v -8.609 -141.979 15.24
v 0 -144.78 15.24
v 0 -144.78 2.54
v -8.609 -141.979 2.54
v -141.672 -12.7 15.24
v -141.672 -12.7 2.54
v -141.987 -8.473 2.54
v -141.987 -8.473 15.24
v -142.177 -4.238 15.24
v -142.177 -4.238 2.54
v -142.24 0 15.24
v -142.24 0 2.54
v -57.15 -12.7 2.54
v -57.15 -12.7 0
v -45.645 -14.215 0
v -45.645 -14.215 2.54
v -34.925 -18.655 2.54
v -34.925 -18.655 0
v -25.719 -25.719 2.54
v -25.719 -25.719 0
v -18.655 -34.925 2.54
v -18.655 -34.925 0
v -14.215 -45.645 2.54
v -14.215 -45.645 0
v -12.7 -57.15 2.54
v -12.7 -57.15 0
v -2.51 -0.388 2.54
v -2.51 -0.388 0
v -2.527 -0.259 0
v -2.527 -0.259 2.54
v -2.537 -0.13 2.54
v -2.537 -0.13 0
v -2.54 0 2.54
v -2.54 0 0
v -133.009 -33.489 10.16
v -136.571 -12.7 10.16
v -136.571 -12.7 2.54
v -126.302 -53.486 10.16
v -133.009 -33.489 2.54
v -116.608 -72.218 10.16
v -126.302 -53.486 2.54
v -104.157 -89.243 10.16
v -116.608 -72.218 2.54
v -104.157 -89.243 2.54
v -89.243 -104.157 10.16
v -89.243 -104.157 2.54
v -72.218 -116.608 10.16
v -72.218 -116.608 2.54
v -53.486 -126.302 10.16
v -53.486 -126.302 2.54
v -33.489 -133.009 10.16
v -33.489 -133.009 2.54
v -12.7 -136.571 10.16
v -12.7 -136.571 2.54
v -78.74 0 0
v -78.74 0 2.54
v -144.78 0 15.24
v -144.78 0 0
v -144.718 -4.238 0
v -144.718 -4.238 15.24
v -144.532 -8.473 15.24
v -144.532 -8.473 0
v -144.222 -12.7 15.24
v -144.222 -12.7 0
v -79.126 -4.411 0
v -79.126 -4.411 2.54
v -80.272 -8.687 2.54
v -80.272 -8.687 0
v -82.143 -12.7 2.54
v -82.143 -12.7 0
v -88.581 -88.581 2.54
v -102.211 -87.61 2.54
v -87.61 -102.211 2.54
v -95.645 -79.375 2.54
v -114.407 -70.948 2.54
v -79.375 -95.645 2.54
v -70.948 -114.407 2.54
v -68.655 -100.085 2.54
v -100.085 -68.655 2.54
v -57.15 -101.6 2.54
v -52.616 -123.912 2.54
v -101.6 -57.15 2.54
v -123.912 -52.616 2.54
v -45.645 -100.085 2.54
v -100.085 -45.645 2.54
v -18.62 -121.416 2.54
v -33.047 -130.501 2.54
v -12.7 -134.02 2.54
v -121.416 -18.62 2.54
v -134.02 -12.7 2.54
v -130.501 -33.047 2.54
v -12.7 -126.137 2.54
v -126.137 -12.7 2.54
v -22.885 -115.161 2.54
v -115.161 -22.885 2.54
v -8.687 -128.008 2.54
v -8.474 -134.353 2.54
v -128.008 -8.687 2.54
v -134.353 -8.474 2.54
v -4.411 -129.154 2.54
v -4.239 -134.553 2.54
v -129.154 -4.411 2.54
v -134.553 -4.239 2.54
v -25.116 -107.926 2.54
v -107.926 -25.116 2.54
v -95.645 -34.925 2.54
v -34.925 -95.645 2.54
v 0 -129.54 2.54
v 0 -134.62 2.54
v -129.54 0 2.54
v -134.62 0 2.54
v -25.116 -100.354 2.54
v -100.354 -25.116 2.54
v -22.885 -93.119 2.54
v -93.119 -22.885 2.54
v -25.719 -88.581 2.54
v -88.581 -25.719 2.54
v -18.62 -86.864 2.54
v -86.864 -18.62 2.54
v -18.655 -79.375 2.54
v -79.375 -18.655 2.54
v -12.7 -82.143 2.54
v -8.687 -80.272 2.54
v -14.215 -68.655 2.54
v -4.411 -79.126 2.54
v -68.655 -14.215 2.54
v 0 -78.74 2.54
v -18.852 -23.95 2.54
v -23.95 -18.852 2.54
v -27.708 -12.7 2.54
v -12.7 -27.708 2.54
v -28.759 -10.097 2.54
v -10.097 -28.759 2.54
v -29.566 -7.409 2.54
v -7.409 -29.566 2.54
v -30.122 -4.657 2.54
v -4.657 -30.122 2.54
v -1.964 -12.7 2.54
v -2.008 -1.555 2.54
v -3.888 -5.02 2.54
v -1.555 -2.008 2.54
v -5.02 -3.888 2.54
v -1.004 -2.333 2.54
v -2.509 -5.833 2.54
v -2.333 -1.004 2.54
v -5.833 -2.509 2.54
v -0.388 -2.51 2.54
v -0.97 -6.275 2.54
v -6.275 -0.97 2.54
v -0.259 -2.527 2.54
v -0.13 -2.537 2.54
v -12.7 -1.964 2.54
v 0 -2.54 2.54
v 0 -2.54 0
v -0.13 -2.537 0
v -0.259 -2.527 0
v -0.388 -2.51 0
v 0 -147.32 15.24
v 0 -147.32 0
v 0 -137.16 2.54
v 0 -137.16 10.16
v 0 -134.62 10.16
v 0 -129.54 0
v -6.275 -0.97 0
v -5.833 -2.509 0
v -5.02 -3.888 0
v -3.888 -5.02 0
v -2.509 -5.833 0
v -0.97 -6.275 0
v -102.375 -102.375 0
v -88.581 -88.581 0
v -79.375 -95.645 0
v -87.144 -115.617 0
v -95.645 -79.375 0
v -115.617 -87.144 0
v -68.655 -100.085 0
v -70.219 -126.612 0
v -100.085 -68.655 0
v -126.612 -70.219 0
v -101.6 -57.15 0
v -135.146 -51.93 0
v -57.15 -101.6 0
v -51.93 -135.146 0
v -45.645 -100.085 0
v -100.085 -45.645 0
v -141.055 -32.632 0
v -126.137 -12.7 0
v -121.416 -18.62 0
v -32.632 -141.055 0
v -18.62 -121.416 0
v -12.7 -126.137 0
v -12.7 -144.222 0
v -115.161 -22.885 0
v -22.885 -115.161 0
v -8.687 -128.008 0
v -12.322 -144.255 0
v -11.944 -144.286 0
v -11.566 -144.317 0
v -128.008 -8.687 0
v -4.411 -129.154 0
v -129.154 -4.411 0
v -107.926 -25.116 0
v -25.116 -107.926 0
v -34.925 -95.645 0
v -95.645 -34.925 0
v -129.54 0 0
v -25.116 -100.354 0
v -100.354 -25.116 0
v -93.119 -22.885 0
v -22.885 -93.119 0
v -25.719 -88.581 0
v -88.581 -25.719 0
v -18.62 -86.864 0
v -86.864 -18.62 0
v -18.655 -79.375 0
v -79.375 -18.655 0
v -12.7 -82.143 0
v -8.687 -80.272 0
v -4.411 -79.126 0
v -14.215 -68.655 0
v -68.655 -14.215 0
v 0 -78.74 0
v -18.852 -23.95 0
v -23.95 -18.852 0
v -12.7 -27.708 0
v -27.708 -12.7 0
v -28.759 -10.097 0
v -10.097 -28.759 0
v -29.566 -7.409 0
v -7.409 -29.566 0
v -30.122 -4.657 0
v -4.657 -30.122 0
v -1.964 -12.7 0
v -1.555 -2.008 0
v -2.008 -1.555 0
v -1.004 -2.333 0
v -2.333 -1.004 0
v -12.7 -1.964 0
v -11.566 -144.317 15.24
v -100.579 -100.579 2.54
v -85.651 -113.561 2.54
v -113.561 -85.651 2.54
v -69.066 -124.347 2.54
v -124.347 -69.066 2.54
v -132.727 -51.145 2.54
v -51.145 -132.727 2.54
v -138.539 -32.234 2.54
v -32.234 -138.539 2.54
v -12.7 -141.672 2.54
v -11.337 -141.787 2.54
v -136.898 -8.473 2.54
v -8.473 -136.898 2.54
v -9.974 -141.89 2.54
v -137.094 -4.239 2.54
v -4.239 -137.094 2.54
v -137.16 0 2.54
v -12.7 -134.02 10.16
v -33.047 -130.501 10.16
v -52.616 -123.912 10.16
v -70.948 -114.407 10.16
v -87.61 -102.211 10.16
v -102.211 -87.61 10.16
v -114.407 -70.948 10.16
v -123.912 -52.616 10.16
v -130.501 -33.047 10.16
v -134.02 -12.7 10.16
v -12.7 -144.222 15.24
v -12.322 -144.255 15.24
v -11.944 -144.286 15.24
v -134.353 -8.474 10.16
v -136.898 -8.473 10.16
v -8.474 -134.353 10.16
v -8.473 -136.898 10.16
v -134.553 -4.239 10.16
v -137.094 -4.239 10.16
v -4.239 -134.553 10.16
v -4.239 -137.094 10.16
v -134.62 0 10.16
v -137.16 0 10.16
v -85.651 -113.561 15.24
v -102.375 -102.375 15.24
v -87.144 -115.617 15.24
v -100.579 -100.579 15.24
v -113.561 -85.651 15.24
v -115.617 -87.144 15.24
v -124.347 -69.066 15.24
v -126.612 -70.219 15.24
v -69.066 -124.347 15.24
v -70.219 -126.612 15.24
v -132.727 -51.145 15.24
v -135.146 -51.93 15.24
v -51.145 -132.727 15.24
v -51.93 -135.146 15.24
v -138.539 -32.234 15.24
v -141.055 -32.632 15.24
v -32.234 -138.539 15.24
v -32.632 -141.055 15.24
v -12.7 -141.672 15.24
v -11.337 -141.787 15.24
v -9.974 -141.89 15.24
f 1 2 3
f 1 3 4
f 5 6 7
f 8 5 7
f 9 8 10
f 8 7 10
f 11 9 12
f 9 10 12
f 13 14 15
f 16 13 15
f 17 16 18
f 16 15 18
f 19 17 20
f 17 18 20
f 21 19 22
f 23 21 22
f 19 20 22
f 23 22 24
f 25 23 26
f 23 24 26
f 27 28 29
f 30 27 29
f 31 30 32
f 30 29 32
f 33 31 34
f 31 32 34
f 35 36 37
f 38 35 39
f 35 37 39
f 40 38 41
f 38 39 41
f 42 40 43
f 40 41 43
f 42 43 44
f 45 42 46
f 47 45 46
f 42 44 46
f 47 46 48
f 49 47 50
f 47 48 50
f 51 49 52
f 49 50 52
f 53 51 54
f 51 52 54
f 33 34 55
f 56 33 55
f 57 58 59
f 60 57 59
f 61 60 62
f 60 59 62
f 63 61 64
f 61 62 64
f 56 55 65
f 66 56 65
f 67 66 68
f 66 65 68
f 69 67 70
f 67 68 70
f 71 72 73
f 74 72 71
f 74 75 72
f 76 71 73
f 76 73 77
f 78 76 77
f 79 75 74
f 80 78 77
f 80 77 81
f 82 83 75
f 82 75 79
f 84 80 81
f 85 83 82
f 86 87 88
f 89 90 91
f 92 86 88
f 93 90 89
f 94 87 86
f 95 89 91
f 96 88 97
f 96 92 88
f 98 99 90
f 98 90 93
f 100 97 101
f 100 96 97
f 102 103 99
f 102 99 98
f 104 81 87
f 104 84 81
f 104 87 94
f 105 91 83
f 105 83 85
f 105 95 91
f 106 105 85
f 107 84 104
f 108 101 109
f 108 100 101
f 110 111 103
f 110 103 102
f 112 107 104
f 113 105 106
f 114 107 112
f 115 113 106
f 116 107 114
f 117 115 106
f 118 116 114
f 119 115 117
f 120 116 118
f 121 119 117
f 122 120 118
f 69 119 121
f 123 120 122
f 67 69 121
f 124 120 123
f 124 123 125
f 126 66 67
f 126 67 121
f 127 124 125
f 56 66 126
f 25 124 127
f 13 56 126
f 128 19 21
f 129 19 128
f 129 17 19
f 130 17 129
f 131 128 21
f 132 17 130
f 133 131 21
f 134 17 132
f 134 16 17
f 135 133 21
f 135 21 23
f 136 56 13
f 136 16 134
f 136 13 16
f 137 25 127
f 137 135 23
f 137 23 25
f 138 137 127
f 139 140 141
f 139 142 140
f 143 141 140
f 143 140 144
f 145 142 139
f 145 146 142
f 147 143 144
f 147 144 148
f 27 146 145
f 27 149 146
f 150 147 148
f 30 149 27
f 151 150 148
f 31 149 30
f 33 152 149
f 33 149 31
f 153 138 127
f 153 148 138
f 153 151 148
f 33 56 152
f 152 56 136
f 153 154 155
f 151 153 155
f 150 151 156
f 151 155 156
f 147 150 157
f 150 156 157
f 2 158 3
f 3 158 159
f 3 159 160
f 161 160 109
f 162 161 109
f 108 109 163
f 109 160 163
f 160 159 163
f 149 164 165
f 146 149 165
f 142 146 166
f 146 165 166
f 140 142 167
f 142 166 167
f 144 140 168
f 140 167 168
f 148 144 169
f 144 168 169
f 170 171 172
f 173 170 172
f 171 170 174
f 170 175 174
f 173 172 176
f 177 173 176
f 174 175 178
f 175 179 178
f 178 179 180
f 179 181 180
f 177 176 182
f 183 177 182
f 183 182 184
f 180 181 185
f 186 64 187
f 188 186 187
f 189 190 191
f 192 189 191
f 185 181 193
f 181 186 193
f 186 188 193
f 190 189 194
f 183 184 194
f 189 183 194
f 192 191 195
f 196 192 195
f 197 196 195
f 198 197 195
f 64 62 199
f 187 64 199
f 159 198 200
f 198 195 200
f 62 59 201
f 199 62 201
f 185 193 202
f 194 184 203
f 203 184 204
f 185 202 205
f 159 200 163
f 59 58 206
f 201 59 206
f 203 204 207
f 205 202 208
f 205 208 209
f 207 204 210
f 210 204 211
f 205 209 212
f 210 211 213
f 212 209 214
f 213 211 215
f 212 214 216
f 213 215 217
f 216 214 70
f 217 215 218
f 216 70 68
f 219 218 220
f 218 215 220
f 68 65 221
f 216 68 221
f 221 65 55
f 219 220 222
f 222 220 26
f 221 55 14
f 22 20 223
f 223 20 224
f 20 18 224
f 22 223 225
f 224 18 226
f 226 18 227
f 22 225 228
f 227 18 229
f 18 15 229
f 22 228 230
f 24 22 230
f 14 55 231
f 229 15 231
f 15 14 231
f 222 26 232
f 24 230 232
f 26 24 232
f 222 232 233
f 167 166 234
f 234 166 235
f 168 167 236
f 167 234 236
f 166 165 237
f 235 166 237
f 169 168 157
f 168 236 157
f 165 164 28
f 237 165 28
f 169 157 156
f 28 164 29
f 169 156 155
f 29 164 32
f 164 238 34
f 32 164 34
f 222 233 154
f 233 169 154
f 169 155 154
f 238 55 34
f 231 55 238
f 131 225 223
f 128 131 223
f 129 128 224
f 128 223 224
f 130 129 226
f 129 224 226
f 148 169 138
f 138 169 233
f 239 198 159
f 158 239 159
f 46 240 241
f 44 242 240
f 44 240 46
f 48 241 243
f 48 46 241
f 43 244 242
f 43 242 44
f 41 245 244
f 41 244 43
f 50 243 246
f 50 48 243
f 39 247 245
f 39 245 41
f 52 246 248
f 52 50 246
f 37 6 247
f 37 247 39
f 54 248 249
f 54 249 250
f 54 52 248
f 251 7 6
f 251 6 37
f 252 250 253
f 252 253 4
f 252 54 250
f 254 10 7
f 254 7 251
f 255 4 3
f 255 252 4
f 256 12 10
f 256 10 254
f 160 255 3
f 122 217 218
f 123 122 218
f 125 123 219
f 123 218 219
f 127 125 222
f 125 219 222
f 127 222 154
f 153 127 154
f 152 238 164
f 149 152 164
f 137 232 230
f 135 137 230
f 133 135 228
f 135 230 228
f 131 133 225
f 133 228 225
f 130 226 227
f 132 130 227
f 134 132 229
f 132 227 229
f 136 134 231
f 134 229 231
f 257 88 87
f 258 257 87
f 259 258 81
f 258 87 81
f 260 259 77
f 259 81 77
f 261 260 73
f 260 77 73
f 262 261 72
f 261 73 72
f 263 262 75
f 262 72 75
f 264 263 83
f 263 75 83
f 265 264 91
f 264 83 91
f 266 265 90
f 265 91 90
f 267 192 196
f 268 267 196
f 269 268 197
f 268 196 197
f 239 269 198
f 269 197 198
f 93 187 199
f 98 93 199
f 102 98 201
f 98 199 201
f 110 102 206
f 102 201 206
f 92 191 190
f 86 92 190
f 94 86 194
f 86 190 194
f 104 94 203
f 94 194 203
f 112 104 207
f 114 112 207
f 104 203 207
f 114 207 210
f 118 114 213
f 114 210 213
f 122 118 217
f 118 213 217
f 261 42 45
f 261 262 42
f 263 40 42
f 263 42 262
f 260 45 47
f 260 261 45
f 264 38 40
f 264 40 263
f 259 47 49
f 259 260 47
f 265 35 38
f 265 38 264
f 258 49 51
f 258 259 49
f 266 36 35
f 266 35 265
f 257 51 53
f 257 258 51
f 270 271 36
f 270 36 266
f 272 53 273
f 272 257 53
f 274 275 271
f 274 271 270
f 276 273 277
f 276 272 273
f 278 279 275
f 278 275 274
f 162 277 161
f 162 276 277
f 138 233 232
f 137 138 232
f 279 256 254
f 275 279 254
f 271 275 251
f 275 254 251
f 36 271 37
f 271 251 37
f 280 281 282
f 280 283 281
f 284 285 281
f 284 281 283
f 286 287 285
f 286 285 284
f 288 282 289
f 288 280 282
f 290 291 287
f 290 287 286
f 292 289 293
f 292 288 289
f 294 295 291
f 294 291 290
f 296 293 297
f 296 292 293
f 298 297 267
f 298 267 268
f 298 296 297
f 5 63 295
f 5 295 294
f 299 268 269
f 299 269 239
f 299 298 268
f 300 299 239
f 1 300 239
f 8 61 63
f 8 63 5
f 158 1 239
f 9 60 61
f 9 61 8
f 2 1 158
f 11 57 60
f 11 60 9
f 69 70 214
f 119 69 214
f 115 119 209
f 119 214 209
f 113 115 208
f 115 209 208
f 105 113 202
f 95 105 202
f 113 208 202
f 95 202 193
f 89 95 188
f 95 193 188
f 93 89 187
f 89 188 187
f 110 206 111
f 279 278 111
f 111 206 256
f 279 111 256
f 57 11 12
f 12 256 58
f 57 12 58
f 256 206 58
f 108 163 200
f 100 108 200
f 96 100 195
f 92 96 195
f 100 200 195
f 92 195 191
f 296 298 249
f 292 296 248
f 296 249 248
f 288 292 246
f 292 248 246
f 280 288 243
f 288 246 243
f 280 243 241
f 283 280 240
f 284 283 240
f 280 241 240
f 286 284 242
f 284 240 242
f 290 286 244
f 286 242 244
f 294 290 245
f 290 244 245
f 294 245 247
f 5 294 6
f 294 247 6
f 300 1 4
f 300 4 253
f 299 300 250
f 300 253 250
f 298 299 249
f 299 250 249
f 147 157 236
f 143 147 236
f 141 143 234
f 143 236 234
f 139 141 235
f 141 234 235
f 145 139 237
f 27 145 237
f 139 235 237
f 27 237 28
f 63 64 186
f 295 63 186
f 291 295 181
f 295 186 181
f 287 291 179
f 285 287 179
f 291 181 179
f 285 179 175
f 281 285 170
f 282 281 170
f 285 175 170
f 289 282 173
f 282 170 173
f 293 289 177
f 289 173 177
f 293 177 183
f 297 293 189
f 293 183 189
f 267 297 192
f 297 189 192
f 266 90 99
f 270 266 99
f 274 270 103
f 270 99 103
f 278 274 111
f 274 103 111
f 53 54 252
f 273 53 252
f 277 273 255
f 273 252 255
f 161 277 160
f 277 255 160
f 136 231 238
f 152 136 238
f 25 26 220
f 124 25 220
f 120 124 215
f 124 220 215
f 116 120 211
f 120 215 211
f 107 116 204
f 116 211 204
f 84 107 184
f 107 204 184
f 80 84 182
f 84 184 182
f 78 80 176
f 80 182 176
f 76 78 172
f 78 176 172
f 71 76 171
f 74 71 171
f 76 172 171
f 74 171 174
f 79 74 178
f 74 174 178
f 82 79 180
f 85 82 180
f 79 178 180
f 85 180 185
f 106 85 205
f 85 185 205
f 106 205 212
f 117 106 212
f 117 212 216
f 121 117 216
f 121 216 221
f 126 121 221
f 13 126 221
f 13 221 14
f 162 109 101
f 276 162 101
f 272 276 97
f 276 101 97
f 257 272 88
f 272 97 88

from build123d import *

# Parameters (mm, degrees)
F1_DEPTH = 2.54
F2_DEPTH = 10.16
F3_DEPTH = 2.54
F4_DEPTH = 15.24


with BuildPart() as f1:
    # F0 (on Top) → F1 (new body)
    with BuildSketch(Plane.XY):
        with BuildLine():
            ThreePointArc((-12.7, -134.0196045361), (-6.3570919986, -134.4698173618), (0, -134.62))
            Line((0, -134.62), (0, -129.54))
            ThreePointArc((0, -129.54), (-6.5740037456, -128.6745159877), (-12.7, -126.1370452561))
            Line((-12.7, -126.1370452561), (-12.7, -134.0196045361))
        make_face()
        with BuildLine():
            ThreePointArc((-134.0196045361, -12.7), (-95.1907148833, -95.1907148833), (-12.7, -134.0196045361))
            Line((-12.7, -134.0196045361), (-12.7, -126.1370452561))
            ThreePointArc((-12.7, -126.1370452561), (-25.4, -104.14), (-12.7, -82.1429547439))
            Line((-12.7, -82.1429547439), (-12.7, -57.15))
            ThreePointArc((-12.7, -57.15), (-88.5808964237, -88.5808964237), (-57.15, -12.7))
            Line((-57.15, -12.7), (-82.1429547439, -12.7))
            ThreePointArc((-82.1429547439, -12.7), (-104.14, -25.4), (-126.1370452561, -12.7))
            Line((-126.1370452561, -12.7), (-134.0196045361, -12.7))
        make_face()
        with BuildLine():
            ThreePointArc((-2.510175815, -0.3880945475), (-2.5325329781, -0.1946194105), (-2.54, 0))
            Line((-2.54, 0), (-6.35, 0))
            ThreePointArc((-6.35, 0), (-6.3313324452, -0.4865485263), (-6.2754395375, -0.9702363687))
            Line((-6.2754395375, -0.9702363687), (-2.510175815, -0.3880945475))
        make_face()
        with BuildLine():
            ThreePointArc((-134.62, 0), (-134.4698173618, -6.3570919986), (-134.0196045361, -12.7))
            Line((-134.0196045361, -12.7), (-126.1370452561, -12.7))
            ThreePointArc((-126.1370452561, -12.7), (-128.6745159877, -6.5740037456), (-129.54, 0))
            Line((-129.54, 0), (-134.62, 0))
        make_face()
        with BuildLine():
            ThreePointArc((-57.15, -12.7), (-25.7191035763, -25.7191035763), (-12.7, -57.15))
            Line((-12.7, -57.15), (-12.7, -27.7081287712))
            ThreePointArc((-12.7, -27.7081287712), (-21.5526146906, -21.5526146906), (-27.7081287712, -12.7))
            Line((-27.7081287712, -12.7), (-57.15, -12.7))
        make_face()
        with BuildLine():
            Line((-30.12210978, -4.6571345698), (-82.1429547439, -12.7))
            Line((-82.1429547439, -12.7), (-57.15, -12.7))
            Line((-57.15, -12.7), (-27.7081287712, -12.7))
            ThreePointArc((-27.7081287712, -12.7), (-29.1934246673, -8.7620977053), (-30.12210978, -4.6571345698))
        make_face()
        with BuildLine():
            Line((-12.7, -57.15), (-12.7, -82.1429547439))
            Line((-12.7, -82.1429547439), (-4.6571345698, -30.12210978))
            ThreePointArc((-4.6571345698, -30.12210978), (-8.7620977053, -29.1934246673), (-12.7, -27.7081287712))
            Line((-12.7, -27.7081287712), (-12.7, -57.15))
        make_face()
        with BuildLine():
            ThreePointArc((-12.7, -82.1429547439), (-6.5740037456, -79.6054840123), (0, -78.74))
            Line((0, -78.74), (0, -30.48))
            ThreePointArc((0, -30.48), (-2.3354329262, -30.3903957369), (-4.6571345698, -30.12210978))
            Line((-4.6571345698, -30.12210978), (-12.7, -82.1429547439))
        make_face()
        with BuildLine():
            ThreePointArc((-4.6571345698, -30.12210978), (-2.3354329262, -30.3903957369), (0, -30.48))
            Line((0, -30.48), (0, -12.7))
            Line((0, -12.7), (-1.9635281017, -12.7))
            Line((-1.9635281017, -12.7), (-4.6571345698, -30.12210978))
        make_face()
        with BuildLine():
            Line((-1.9635281017, -12.7), (0, -12.7))
            Line((0, -12.7), (0, -6.35))
            ThreePointArc((0, -6.35), (-0.4865485263, -6.3313324452), (-0.9702363687, -6.2754395375))
            Line((-0.9702363687, -6.2754395375), (-1.9635281017, -12.7))
        make_face()
        with BuildLine():
            ThreePointArc((-0.9702363687, -6.2754395375), (-0.4865485263, -6.3313324452), (0, -6.35))
            Line((0, -6.35), (0, -2.54))
            ThreePointArc((0, -2.54), (-0.1946194105, -2.5325329781), (-0.3880945475, -2.510175815))
            Line((-0.3880945475, -2.510175815), (-0.9702363687, -6.2754395375))
        make_face()
        with BuildLine():
            Line((-0.9702363687, -6.2754395375), (-0.3880945475, -2.510175815))
            ThreePointArc((-0.3880945475, -2.510175815), (-1.7960512242, -1.7960512242), (-2.510175815, -0.3880945475))
            Line((-2.510175815, -0.3880945475), (-6.2754395375, -0.9702363687))
            ThreePointArc((-6.2754395375, -0.9702363687), (-4.4901280605, -4.4901280605), (-0.9702363687, -6.2754395375))
        make_face()
        with BuildLine():
            ThreePointArc((-30.48, 0), (-30.3903957369, -2.3354329262), (-30.12210978, -4.6571345698))
            Line((-30.12210978, -4.6571345698), (-12.7, -1.9635281017))
            Line((-12.7, -1.9635281017), (-12.7, 0))
            Line((-12.7, 0), (-30.48, 0))
        make_face()
        with BuildLine():
            Line((-12.7, 0), (-12.7, -1.9635281017))
            Line((-12.7, -1.9635281017), (-6.2754395375, -0.9702363687))
            ThreePointArc((-6.2754395375, -0.9702363687), (-6.3313324452, -0.4865485263), (-6.35, 0))
            Line((-6.35, 0), (-12.7, 0))
        make_face()
        with BuildLine():
            ThreePointArc((-78.74, 0), (-79.6054840123, -6.5740037456), (-82.1429547439, -12.7))
            Line((-82.1429547439, -12.7), (-30.12210978, -4.6571345698))
            ThreePointArc((-30.12210978, -4.6571345698), (-30.3903957369, -2.3354329262), (-30.48, 0))
            Line((-30.48, 0), (-78.74, 0))
        make_face()
    extrude(amount=F1_DEPTH)

    # F0 (on Top) → F2 (join)
    with BuildSketch(Plane.XY):
        with BuildLine():
            Line((0, -137.16), (0, -134.62))
            ThreePointArc((0, -134.62), (-6.3570919986, -134.4698173618), (-12.7, -134.0196045361))
            Line((-12.7, -134.0196045361), (-12.7, -136.5707713971))
            ThreePointArc((-12.7, -136.5707713971), (-6.3568307817, -137.0126136617), (0, -137.16))
        make_face()
        with BuildLine():
            Line((-12.7, -136.5707713971), (-12.7, -134.0196045361))
            ThreePointArc((-12.7, -134.0196045361), (-95.1907148833, -95.1907148833), (-134.0196045361, -12.7))
            Line((-134.0196045361, -12.7), (-136.5707713971, -12.7))
            ThreePointArc((-136.5707713971, -12.7), (-96.9867661075, -96.9867661075), (-12.7, -136.5707713971))
        make_face()
        with BuildLine():
            Line((-136.5707713971, -12.7), (-134.0196045361, -12.7))
            ThreePointArc((-134.0196045361, -12.7), (-134.4698173618, -6.3570919986), (-134.62, 0))
            Line((-134.62, 0), (-137.16, 0))
            ThreePointArc((-137.16, 0), (-137.0126136617, -6.3568307817), (-136.5707713971, -12.7))
        make_face()
    extrude(amount=F2_DEPTH)

    # F0 (on Top) → F3 (join)
    with BuildSketch(Plane.XY):
        with BuildLine():
            Line((0, -142.24), (0, -137.16))
            ThreePointArc((0, -137.16), (-6.3568307817, -137.0126136617), (-12.7, -136.5707713971))
            Line((-12.7, -136.5707713971), (-12.7, -141.6719012366))
            ThreePointArc((-12.7, -141.6719012366), (-10.6556073906, -141.8403173683), (-8.6089986235, -141.979233491))
            ThreePointArc((-8.6089986235, -141.979233491), (-4.306473513, -142.1747934265), (0, -142.24))
        make_face()
        with BuildLine():
            Line((0, -144.78), (0, -142.24))
            ThreePointArc((0, -142.24), (-4.306473513, -142.1747934265), (-8.6089986235, -141.979233491))
            Line((-8.6089986235, -141.979233491), (0, -144.78))
        make_face()
        with BuildLine():
            Line((-12.7, -141.6719012366), (-12.7, -136.5707713971))
            ThreePointArc((-12.7, -136.5707713971), (-96.9867661075, -96.9867661075), (-136.5707713971, -12.7))
            Line((-136.5707713971, -12.7), (-141.6719012366, -12.7))
            ThreePointArc((-141.6719012366, -12.7), (-100.578868556, -100.578868556), (-12.7, -141.6719012366))
        make_face()
        with BuildLine():
            Line((-141.6719012366, -12.7), (-136.5707713971, -12.7))
            ThreePointArc((-136.5707713971, -12.7), (-137.0126136617, -6.3568307817), (-137.16, 0))
            Line((-137.16, 0), (-142.24, 0))
            ThreePointArc((-142.24, 0), (-142.0979043334, -6.3563499), (-141.6719012366, -12.7))
        make_face()
    extrude(amount=F3_DEPTH)

    # F0 (on Top) → F4 (join)
    with BuildSketch(Plane.XY):
        with BuildLine():
            ThreePointArc((-8.6089986235, -141.979233491), (-10.6556073906, -141.8403173683), (-12.7, -141.6719012366))
            Line((-12.7, -141.6719012366), (-12.7, -144.2219067964))
            ThreePointArc((-12.7, -144.2219067964), (-12.1332804652, -144.2706896953), (-11.5663736451, -144.3172456801))
            ThreePointArc((-11.5663736451, -144.3172456801), (-5.787813509, -144.6642651617), (0, -144.78))
            Line((0, -144.78), (-8.6089986235, -141.979233491))
        make_face()
        with BuildLine():
            Line((0, -147.32), (0, -144.78))
            ThreePointArc((0, -144.78), (-5.787813509, -144.6642651617), (-11.5663736451, -144.3172456801))
            Line((-11.5663736451, -144.3172456801), (0, -147.32))
        make_face()
        with BuildLine():
            Line((-12.7, -144.2219067964), (-12.7, -141.6719012366))
            ThreePointArc((-12.7, -141.6719012366), (-100.578868556, -100.578868556), (-141.6719012366, -12.7))
            Line((-141.6719012366, -12.7), (-144.2219067964, -12.7))
            ThreePointArc((-144.2219067964, -12.7), (-102.3749197802, -102.3749197802), (-12.7, -144.2219067964))
        make_face()
        with BuildLine():
            Line((-144.2219067964, -12.7), (-141.6719012366, -12.7))
            ThreePointArc((-141.6719012366, -12.7), (-142.0979043334, -6.3563499), (-142.24, 0))
            Line((-142.24, 0), (-144.78, 0))
            ThreePointArc((-144.78, 0), (-144.6404094055, -6.3561283031), (-144.2219067964, -12.7))
        make_face()
    extrude(amount=F4_DEPTH)


solid = f1.part
